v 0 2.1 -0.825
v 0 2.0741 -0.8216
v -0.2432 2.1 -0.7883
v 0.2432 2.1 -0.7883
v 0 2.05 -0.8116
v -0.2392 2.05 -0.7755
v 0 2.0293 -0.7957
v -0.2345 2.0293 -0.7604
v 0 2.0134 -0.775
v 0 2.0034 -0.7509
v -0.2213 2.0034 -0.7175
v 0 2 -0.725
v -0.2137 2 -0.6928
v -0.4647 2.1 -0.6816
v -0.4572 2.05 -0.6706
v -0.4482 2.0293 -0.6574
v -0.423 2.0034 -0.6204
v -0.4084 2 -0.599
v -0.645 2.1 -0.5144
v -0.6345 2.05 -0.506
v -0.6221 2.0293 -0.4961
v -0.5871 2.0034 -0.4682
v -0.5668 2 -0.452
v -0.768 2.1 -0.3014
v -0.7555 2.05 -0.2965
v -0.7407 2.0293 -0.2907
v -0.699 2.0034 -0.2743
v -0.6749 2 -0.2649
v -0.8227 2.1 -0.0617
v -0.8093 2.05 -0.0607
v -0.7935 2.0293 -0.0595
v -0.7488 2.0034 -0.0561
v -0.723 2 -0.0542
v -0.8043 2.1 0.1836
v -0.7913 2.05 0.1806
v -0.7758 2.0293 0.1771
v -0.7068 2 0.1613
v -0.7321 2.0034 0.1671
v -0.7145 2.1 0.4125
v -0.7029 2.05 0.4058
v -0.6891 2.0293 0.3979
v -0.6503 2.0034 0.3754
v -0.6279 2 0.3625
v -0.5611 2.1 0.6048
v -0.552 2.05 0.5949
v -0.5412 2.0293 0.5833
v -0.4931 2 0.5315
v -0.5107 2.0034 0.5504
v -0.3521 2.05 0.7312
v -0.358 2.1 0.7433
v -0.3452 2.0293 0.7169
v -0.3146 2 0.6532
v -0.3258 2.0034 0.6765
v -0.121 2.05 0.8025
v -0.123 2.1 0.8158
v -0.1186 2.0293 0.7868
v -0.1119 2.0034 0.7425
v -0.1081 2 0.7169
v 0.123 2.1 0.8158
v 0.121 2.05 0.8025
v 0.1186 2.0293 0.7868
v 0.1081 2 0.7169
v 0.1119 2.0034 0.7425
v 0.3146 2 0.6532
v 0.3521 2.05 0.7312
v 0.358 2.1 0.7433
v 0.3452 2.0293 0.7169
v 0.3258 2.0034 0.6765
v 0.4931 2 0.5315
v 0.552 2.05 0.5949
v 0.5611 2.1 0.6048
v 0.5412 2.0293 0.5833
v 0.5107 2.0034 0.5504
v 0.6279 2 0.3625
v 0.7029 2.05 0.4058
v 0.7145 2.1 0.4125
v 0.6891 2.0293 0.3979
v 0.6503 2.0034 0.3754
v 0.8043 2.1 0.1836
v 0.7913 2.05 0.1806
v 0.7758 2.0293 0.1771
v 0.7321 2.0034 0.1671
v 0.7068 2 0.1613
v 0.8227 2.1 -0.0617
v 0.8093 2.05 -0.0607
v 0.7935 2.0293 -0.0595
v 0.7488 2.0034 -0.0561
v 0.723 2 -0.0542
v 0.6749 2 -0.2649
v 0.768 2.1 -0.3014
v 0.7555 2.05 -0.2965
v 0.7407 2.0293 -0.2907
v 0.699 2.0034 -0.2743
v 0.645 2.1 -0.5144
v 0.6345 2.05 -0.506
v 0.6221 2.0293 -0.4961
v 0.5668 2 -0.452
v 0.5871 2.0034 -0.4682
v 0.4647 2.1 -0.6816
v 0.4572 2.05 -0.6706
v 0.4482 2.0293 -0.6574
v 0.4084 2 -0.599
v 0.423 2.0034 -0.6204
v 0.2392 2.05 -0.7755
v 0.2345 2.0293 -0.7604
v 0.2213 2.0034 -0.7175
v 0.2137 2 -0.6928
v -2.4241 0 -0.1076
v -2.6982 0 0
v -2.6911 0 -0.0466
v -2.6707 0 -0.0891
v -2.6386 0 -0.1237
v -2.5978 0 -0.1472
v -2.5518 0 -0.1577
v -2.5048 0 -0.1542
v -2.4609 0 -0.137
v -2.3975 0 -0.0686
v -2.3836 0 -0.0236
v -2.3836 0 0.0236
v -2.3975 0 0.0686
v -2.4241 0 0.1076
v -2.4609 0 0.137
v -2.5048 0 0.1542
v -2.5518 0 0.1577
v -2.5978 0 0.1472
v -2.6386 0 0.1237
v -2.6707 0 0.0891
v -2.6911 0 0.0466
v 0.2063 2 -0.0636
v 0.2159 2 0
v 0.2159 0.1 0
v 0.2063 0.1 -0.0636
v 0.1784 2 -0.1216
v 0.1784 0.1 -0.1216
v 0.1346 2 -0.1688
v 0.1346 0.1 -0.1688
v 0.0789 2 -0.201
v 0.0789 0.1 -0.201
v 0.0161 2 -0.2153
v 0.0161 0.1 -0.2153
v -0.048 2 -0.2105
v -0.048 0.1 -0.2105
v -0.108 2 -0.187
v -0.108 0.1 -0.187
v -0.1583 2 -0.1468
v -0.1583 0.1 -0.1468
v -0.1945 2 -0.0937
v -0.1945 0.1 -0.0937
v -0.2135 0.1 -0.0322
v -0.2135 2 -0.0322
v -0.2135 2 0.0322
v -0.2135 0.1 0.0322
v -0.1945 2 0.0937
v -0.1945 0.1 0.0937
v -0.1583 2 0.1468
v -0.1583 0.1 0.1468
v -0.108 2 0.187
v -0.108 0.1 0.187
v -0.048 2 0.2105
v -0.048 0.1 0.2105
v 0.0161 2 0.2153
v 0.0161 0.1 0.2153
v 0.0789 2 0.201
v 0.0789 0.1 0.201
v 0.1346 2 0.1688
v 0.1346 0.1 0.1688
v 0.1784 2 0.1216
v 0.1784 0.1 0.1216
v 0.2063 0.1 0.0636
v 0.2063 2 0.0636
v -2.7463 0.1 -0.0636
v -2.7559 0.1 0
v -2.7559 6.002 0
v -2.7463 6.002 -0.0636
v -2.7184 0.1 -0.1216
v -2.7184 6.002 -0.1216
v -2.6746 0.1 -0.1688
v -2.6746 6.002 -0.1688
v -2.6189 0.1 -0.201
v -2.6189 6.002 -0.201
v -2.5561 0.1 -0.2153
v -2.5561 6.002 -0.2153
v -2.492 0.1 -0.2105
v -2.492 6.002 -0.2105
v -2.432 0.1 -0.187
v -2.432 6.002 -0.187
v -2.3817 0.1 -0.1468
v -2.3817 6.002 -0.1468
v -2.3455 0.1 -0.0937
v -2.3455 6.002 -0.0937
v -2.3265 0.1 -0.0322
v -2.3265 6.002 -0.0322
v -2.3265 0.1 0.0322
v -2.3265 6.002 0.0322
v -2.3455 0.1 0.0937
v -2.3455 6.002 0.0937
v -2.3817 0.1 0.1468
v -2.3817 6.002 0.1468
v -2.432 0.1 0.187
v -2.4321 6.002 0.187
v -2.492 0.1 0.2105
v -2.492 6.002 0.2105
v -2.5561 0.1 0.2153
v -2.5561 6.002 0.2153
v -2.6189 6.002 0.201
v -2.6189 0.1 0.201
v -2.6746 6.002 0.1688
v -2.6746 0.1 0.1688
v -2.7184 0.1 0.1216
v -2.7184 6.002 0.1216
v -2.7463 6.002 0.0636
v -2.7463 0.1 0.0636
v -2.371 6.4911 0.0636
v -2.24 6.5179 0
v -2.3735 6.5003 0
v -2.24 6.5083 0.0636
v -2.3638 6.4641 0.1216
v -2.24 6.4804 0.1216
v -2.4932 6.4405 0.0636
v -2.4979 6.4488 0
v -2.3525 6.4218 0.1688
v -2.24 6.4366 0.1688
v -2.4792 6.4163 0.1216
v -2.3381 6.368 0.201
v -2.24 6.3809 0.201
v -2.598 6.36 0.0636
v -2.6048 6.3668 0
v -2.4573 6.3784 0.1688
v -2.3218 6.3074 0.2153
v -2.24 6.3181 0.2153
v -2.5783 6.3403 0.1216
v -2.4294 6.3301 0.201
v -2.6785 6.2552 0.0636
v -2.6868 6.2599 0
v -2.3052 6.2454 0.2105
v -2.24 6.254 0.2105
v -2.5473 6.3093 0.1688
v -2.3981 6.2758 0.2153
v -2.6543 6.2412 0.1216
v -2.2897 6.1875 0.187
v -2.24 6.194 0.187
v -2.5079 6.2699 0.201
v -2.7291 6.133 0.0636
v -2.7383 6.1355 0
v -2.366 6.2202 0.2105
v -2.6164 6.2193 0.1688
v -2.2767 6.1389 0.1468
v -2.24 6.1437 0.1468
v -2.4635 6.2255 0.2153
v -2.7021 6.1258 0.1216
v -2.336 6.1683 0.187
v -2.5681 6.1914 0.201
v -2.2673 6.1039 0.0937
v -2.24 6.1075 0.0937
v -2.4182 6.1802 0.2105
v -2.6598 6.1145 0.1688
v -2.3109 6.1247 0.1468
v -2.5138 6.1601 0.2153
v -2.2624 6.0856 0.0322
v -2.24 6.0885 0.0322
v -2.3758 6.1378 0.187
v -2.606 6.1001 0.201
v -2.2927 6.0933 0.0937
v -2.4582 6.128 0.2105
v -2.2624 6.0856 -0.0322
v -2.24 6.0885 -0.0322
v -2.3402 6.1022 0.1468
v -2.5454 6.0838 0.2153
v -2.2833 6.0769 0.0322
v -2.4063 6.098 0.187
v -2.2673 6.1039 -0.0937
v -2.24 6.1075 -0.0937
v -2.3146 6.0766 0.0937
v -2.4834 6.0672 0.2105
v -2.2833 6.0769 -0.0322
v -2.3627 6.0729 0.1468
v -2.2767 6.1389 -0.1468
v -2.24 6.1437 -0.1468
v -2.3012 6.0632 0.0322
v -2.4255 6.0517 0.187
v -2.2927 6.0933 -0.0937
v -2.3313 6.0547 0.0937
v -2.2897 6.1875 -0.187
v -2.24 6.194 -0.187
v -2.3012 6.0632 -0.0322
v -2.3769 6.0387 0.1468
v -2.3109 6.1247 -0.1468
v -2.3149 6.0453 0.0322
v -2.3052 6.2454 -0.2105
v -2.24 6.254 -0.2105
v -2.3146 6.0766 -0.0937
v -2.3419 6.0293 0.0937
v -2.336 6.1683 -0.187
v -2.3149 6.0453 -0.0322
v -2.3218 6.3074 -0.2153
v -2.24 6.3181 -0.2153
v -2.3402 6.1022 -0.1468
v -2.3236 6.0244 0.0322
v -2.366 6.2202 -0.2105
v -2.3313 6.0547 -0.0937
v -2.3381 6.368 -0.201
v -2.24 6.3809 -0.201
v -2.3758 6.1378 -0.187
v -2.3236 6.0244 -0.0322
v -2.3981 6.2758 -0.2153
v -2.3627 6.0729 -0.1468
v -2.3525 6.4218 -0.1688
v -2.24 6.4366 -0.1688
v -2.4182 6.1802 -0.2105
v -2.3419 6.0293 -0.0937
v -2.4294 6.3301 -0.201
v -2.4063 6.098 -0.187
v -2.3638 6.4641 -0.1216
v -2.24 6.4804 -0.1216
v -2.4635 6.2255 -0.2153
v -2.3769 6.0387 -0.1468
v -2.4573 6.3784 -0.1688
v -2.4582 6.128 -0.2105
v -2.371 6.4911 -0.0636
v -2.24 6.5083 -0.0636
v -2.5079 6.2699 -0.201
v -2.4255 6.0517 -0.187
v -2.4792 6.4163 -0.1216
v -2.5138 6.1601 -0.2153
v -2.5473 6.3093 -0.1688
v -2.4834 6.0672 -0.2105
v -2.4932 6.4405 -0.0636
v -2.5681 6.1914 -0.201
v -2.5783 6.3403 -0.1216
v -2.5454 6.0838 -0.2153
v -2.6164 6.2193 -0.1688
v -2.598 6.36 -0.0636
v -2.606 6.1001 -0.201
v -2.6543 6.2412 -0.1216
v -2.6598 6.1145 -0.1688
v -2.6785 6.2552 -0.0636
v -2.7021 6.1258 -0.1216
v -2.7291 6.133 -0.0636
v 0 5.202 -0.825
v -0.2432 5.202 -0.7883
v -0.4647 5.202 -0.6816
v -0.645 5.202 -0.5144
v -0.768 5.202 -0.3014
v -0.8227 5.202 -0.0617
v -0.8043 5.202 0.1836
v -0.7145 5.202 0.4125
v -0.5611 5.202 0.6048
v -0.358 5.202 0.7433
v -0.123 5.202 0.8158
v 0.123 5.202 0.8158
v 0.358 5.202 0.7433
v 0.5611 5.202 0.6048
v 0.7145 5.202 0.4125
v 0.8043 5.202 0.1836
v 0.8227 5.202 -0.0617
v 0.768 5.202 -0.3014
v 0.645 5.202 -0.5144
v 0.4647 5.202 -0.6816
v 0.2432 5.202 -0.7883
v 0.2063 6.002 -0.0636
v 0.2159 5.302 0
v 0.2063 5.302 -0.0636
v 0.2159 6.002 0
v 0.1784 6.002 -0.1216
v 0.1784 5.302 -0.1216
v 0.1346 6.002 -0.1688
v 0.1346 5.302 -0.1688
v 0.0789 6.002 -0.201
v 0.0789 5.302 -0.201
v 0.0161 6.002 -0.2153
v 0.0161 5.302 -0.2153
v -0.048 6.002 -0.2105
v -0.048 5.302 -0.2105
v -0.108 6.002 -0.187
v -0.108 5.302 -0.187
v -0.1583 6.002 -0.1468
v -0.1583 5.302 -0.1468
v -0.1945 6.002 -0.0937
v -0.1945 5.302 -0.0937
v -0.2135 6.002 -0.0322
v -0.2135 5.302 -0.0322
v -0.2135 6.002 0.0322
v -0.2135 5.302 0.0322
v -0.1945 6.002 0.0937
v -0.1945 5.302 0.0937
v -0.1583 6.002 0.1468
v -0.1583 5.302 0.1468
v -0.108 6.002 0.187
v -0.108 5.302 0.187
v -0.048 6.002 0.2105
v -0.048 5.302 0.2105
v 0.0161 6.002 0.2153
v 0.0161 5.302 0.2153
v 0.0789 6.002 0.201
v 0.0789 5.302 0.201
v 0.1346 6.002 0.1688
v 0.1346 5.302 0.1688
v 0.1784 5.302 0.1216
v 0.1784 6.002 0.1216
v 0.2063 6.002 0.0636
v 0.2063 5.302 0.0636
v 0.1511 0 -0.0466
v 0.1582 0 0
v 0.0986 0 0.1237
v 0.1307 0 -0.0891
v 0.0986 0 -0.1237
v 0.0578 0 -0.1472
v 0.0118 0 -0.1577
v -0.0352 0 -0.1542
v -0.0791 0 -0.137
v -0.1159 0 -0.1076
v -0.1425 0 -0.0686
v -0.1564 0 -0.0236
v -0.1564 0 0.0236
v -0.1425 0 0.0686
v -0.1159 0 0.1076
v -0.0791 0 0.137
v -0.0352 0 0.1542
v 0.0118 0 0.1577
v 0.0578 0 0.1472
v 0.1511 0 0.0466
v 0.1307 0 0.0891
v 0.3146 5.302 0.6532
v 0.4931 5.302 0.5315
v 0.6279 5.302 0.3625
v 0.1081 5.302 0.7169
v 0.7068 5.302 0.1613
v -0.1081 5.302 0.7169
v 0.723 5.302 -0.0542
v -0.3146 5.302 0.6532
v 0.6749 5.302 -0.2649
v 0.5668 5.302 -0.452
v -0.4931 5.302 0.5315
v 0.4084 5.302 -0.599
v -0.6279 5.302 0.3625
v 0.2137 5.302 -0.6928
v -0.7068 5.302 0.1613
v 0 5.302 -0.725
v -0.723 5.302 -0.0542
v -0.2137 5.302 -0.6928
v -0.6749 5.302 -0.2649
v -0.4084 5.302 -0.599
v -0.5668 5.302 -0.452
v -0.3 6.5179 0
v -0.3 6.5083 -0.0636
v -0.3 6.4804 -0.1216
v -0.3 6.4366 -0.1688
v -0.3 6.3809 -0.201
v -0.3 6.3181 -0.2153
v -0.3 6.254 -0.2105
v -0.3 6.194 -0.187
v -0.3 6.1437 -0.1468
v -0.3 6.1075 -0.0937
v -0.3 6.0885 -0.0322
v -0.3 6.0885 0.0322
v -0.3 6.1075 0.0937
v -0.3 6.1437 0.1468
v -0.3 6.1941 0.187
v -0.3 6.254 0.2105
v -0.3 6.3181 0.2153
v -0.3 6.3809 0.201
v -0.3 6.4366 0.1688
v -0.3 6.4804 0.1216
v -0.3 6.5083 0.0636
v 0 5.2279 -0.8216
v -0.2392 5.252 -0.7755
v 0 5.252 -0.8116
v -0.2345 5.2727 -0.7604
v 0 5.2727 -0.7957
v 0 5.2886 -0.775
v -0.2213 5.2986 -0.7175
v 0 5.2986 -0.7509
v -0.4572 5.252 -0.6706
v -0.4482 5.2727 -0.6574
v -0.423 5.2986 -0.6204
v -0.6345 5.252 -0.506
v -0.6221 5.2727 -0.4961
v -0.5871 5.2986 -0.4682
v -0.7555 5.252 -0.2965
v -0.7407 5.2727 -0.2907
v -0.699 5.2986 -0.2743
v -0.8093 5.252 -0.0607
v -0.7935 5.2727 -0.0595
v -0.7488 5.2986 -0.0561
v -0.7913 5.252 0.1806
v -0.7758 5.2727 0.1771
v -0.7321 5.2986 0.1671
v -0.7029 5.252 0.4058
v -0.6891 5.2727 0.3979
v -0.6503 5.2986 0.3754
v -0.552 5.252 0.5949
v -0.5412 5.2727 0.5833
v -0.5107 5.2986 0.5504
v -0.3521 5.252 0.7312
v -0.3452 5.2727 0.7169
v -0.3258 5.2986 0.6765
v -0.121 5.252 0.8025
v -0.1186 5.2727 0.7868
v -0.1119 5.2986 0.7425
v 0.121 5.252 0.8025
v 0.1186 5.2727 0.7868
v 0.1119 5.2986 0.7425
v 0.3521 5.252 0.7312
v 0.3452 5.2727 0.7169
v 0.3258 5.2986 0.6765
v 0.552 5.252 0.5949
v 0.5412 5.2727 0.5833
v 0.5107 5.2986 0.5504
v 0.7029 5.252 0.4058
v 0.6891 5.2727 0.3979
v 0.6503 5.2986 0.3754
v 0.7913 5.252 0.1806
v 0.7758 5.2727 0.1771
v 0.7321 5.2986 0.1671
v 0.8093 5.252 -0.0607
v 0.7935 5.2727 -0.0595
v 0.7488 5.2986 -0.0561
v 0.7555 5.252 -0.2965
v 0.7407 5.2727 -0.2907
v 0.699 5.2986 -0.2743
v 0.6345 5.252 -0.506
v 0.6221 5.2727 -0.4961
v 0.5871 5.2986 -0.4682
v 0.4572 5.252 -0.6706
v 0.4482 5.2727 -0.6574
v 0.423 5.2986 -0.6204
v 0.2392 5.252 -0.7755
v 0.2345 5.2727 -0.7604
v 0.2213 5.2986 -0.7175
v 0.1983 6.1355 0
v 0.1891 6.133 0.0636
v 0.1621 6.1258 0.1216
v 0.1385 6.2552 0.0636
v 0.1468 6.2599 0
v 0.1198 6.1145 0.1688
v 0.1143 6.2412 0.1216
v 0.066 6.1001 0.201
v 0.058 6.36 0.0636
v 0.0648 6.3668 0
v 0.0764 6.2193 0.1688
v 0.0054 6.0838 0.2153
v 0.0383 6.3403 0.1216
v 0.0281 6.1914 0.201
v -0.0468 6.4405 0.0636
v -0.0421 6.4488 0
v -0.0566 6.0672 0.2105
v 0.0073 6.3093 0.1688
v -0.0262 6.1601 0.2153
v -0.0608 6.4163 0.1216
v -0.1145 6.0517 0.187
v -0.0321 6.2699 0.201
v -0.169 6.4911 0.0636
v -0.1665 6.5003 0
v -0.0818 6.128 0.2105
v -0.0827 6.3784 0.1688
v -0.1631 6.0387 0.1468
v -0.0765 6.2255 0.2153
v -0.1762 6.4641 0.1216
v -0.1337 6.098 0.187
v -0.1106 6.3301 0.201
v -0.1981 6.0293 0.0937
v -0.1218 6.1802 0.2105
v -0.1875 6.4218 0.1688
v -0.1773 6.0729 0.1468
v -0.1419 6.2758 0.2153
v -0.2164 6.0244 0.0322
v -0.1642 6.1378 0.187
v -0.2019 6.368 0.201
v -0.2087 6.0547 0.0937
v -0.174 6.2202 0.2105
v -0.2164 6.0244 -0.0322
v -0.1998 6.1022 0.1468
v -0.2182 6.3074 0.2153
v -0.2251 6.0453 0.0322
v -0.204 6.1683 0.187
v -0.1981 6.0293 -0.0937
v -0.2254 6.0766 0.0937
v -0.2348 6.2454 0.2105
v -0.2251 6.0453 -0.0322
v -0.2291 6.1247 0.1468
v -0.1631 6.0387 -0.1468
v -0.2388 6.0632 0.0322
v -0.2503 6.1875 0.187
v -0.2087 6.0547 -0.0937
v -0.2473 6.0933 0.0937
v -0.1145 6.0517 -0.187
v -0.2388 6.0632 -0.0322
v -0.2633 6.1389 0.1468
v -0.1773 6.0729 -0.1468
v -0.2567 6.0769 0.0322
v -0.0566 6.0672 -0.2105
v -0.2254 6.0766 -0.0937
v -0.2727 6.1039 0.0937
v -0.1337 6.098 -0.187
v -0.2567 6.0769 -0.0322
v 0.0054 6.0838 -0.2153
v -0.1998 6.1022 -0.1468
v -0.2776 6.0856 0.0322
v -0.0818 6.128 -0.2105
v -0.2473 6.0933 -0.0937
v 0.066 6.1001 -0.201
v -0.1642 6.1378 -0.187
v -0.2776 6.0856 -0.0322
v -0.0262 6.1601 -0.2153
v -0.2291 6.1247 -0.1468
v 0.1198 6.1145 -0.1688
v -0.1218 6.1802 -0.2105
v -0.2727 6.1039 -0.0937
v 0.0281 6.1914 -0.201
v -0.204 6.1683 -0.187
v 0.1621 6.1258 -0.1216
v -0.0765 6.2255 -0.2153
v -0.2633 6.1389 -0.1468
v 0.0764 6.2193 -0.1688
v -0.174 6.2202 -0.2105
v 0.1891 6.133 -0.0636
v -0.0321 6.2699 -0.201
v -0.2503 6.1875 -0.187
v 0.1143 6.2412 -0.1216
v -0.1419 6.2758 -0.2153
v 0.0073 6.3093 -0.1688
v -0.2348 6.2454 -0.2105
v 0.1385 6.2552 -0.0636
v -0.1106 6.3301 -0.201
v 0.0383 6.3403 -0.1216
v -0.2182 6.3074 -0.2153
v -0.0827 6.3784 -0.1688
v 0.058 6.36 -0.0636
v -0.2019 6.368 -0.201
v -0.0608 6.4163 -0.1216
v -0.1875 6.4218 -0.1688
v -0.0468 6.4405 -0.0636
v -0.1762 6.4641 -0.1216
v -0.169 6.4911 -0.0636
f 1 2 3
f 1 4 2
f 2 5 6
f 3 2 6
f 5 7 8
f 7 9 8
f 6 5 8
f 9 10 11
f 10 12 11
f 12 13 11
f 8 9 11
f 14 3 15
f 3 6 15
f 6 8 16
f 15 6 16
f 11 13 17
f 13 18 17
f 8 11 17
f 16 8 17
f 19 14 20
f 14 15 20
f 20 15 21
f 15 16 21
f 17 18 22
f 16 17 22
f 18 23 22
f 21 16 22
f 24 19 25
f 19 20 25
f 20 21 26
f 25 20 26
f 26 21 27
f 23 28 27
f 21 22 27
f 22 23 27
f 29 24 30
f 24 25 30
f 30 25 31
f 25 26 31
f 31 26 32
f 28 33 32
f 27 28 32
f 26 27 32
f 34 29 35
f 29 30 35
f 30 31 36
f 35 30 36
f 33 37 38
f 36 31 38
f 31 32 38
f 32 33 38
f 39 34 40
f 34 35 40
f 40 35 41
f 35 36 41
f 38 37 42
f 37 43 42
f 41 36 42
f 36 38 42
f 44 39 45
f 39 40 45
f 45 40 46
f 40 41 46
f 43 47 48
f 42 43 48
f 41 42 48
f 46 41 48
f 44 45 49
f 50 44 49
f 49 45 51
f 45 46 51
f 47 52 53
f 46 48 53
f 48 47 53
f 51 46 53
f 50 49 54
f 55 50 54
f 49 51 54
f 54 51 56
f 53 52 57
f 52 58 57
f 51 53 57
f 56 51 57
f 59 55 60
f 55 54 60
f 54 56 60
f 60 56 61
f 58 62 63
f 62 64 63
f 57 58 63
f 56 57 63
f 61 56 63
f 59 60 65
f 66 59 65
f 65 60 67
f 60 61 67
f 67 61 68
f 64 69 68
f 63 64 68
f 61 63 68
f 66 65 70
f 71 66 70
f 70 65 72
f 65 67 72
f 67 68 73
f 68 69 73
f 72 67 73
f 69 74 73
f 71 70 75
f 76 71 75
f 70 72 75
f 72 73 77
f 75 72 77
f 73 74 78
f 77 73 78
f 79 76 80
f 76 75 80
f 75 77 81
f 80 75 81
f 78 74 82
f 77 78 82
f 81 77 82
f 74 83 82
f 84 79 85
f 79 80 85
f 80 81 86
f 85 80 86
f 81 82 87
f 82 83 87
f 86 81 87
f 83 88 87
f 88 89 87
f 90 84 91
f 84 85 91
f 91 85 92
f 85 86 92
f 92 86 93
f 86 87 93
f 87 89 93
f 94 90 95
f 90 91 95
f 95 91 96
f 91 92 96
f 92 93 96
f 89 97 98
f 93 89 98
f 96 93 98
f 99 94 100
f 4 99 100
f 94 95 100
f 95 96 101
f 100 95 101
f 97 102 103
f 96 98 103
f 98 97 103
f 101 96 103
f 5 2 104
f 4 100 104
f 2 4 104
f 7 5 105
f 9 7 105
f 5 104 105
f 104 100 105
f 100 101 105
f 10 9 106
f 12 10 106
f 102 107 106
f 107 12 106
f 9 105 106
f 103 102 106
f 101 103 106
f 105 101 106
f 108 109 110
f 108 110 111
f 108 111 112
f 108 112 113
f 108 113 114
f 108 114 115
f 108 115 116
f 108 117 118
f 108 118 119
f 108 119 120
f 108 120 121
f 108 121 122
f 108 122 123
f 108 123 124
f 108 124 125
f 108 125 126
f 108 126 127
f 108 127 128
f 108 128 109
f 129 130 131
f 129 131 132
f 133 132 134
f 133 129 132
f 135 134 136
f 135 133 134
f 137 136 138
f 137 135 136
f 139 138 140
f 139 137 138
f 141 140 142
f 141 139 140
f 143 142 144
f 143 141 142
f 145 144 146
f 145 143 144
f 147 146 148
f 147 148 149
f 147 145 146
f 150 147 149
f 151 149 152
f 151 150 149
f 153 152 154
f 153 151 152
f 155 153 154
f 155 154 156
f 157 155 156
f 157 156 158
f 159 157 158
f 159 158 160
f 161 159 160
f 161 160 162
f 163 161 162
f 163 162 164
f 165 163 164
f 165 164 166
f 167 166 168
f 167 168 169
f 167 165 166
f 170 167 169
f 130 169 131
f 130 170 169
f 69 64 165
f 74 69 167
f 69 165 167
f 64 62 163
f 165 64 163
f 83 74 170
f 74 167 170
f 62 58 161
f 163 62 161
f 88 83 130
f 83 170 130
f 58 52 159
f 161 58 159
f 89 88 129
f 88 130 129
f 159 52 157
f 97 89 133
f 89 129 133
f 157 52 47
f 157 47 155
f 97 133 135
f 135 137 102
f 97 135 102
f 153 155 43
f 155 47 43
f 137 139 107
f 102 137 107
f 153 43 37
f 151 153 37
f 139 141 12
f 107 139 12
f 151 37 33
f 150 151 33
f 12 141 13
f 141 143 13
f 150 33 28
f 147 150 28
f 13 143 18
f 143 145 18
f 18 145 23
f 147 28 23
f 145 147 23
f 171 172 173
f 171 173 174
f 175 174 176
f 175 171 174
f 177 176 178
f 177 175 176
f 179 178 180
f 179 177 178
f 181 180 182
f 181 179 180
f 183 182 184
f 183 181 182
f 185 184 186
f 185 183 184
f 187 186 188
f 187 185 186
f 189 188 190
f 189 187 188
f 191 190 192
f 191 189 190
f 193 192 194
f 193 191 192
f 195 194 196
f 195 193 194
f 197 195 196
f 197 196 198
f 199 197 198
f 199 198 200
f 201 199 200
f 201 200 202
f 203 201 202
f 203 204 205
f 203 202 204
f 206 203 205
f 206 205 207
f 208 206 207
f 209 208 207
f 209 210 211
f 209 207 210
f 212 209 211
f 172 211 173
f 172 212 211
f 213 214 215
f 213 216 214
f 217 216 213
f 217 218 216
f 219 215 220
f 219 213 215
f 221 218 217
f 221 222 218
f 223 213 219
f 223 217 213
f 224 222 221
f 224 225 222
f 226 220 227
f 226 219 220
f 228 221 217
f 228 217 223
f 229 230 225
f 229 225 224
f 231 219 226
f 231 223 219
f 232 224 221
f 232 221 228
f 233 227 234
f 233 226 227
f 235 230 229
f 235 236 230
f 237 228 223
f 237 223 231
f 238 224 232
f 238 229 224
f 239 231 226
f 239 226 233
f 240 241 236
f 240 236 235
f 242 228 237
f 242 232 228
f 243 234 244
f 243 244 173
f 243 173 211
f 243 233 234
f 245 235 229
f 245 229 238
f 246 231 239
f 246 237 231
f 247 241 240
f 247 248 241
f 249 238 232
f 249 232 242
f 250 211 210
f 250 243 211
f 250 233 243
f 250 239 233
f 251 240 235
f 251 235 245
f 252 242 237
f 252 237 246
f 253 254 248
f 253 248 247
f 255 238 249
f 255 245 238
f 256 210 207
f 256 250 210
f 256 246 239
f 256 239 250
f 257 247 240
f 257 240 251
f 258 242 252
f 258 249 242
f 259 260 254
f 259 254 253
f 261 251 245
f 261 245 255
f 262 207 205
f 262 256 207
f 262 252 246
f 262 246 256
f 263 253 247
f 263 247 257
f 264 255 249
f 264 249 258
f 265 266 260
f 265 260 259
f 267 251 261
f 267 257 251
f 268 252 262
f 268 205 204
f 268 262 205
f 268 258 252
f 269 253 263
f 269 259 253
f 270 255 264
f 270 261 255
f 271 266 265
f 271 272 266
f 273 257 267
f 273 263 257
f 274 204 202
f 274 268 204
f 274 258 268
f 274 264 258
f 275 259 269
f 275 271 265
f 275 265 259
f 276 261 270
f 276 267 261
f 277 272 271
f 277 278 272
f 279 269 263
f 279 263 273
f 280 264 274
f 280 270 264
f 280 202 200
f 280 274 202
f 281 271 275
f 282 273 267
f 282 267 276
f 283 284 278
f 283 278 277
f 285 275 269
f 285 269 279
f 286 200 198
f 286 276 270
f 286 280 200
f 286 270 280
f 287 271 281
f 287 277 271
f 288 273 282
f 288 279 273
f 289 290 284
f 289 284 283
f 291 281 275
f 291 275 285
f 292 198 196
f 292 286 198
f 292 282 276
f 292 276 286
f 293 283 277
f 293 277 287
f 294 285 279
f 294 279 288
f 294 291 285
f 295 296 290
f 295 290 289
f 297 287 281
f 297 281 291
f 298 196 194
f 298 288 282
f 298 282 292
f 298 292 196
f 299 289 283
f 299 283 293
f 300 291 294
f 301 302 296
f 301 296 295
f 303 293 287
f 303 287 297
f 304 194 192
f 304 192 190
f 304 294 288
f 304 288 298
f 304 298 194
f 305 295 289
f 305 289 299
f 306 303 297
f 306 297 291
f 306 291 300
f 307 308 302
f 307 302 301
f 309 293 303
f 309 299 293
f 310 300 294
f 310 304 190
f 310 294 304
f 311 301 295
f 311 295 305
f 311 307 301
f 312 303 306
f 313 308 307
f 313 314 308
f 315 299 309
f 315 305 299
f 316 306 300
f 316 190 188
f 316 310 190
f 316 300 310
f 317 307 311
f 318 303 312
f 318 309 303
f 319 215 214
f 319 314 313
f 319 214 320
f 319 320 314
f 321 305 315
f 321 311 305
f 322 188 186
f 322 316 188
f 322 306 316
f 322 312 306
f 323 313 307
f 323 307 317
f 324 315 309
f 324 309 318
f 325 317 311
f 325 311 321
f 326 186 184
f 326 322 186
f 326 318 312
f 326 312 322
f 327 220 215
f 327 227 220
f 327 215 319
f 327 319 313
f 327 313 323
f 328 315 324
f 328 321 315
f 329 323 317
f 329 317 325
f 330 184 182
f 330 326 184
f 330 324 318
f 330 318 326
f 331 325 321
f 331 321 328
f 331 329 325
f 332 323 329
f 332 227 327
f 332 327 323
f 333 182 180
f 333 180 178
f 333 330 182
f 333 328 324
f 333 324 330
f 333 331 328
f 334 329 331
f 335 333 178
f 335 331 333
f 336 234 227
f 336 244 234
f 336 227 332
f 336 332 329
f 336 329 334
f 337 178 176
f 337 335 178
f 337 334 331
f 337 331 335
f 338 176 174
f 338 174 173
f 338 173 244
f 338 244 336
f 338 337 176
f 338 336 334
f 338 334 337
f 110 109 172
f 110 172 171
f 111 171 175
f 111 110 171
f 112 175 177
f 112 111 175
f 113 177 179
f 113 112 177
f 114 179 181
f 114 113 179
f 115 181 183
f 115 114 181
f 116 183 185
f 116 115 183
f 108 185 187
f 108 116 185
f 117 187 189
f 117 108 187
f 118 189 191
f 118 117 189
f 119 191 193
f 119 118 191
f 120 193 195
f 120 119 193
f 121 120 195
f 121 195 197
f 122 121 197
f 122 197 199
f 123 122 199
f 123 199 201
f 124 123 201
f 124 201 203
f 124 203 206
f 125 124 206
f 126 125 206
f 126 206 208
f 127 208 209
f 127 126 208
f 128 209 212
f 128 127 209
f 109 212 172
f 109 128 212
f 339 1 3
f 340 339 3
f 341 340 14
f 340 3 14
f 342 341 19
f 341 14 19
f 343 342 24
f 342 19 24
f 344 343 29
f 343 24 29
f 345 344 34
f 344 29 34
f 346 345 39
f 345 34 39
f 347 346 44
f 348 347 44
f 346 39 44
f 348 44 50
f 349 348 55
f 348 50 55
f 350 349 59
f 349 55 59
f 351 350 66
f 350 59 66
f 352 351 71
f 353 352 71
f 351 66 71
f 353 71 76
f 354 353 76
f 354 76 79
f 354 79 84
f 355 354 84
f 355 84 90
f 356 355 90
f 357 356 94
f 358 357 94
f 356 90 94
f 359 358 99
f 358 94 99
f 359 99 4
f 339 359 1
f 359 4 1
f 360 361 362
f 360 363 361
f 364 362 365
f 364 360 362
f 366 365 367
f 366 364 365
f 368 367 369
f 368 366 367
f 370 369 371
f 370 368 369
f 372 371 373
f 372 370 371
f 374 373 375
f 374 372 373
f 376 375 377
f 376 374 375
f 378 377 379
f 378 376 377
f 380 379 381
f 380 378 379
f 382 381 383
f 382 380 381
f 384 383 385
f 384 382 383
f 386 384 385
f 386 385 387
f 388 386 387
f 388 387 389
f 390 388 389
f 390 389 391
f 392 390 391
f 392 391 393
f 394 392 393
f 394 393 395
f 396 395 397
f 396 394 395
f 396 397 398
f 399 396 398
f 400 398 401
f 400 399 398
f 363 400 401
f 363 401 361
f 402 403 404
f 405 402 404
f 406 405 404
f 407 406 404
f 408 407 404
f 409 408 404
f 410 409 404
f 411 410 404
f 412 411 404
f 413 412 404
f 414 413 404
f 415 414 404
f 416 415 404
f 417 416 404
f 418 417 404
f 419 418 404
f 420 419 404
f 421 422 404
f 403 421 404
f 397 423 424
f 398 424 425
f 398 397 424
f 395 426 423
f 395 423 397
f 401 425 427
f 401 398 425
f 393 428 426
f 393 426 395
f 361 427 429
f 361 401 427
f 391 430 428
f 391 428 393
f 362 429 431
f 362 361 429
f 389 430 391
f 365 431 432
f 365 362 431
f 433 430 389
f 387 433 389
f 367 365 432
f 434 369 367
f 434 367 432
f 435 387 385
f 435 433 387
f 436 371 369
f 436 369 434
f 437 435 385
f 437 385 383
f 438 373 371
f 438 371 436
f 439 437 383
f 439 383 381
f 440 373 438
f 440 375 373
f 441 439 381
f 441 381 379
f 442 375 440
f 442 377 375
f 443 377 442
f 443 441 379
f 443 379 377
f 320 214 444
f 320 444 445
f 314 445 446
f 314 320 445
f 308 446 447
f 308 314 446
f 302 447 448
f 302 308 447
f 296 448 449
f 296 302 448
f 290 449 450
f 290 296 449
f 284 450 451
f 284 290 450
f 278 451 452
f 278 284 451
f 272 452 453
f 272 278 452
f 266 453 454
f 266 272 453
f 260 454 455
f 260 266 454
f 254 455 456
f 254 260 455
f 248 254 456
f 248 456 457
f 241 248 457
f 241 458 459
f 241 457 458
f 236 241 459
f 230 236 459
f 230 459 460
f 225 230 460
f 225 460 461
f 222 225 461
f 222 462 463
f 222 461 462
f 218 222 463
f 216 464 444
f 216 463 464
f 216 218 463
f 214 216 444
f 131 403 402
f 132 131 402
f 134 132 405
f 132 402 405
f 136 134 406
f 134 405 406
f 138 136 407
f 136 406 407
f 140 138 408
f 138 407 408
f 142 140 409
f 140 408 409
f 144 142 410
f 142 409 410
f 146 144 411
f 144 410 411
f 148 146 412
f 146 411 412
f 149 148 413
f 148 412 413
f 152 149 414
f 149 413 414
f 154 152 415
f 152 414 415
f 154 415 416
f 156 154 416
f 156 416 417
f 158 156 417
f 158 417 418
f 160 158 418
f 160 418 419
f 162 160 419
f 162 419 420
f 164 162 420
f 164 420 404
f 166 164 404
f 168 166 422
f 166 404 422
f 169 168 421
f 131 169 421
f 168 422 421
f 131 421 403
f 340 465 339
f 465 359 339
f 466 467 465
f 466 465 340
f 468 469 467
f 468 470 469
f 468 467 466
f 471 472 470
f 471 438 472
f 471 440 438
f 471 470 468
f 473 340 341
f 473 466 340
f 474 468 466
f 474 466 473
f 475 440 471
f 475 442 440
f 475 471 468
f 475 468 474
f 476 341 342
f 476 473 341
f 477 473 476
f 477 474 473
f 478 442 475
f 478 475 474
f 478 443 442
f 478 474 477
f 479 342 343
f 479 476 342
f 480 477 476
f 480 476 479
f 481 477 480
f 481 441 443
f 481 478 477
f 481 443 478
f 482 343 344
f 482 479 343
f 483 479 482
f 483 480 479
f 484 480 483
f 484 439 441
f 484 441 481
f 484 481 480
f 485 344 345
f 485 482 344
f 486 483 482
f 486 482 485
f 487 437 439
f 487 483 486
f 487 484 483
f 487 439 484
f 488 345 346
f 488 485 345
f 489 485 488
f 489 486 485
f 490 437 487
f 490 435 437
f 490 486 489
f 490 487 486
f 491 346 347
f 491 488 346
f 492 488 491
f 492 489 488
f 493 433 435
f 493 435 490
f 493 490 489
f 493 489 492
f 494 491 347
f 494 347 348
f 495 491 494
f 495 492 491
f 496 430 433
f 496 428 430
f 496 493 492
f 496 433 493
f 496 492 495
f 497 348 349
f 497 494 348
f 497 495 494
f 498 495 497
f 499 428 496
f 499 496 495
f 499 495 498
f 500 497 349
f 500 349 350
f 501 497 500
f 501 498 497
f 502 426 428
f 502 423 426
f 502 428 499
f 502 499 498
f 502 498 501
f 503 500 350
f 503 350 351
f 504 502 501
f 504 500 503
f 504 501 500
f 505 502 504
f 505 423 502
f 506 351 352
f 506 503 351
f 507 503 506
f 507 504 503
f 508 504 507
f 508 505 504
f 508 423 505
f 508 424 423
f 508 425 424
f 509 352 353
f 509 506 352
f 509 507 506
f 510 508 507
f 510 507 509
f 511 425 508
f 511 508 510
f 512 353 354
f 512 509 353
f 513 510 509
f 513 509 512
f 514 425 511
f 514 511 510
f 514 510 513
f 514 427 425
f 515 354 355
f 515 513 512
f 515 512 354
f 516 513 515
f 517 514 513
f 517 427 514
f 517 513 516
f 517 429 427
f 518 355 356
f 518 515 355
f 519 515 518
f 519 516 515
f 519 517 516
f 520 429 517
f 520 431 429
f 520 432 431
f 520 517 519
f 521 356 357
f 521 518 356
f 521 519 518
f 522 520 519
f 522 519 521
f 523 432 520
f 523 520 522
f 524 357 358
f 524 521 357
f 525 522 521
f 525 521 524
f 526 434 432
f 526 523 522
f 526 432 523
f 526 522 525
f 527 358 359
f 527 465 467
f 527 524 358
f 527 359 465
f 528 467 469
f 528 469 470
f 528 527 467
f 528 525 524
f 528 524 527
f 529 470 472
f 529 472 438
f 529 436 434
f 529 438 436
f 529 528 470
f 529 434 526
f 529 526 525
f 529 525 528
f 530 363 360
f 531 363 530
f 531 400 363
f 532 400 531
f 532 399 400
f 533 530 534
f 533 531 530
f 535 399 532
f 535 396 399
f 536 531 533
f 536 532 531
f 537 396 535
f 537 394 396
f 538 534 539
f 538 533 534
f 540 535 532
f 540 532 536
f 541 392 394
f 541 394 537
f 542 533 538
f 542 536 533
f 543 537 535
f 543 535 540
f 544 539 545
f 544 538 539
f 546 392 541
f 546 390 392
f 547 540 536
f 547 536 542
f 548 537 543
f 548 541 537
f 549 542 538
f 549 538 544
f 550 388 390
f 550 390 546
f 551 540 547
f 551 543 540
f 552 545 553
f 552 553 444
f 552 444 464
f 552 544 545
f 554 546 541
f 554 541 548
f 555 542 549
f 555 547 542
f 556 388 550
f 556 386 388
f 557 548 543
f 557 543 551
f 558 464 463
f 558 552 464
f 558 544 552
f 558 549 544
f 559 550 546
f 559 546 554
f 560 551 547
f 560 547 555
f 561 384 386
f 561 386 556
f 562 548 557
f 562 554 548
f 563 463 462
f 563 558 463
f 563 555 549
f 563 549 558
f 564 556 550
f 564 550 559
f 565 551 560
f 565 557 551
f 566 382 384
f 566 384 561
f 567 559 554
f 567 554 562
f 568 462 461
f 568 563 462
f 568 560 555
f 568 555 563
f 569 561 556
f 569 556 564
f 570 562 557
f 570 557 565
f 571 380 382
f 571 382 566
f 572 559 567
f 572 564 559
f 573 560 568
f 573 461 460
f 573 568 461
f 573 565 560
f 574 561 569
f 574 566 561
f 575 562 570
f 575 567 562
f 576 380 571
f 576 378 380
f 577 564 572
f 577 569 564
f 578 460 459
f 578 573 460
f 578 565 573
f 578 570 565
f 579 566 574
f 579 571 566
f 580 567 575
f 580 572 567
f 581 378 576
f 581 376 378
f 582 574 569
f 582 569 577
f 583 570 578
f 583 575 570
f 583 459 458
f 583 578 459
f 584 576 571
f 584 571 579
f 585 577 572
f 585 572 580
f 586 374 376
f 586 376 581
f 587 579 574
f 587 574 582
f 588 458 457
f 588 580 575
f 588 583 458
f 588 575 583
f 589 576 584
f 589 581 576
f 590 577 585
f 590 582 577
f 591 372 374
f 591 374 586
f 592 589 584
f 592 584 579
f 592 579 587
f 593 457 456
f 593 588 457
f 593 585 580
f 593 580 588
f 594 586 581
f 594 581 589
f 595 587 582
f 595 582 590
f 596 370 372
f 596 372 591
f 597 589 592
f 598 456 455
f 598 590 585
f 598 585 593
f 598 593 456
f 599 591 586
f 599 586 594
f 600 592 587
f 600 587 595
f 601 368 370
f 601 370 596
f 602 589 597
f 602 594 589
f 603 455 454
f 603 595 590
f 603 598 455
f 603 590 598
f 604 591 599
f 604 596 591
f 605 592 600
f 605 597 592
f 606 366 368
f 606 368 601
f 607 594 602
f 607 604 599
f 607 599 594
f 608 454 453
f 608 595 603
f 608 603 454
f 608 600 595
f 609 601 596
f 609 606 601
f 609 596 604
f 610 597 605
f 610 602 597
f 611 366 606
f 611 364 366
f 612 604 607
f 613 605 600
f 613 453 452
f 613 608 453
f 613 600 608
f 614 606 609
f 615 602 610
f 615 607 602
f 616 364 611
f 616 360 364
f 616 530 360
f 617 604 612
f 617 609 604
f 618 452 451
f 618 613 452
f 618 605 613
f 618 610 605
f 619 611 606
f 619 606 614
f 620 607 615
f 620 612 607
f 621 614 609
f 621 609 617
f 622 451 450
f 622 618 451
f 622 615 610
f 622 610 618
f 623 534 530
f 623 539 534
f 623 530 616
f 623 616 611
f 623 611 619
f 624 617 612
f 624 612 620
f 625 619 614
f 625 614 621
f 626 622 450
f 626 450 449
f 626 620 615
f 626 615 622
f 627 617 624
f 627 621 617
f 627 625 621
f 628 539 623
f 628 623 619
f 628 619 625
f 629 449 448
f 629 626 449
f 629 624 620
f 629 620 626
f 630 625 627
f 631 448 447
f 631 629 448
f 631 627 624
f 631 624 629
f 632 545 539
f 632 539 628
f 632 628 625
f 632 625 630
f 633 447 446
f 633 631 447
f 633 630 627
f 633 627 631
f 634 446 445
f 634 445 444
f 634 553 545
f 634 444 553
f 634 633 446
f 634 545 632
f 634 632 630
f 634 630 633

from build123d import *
from OCP.BRepFilletAPI import BRepFilletAPI_MakeChamfer

# Parameters (mm, degrees)
SKETCH1_R      = 0.2159
SKETCH3_R      = 0.825
EXTRUDE1_DEPTH = 3.302
FILLET1_R      = 0.1
CHAMFER1_SIZE  = 0.1
CHAMFER1_SIZE2 = 0.057735027


with BuildPart() as part:
    # Sweep1: sweep along a path in Sketch2
    with BuildLine(Plane.XY) as sweep1_path:
        Line((0, 0), (0, 6.002))
        ThreePointArc((0, 6.002), (-0.087867966, 6.214132034), (-0.3, 6.302))
        Line((-0.3, 6.302), (-2.24, 6.302))
        ThreePointArc((-2.24, 6.302), (-2.452132034, 6.214132034), (-2.54, 6.002))
        Line((-2.54, 6.002), (-2.54, 0))
    # Sketch1 → Sweep1 (sweep)
    with BuildSketch(Plane(origin=(0, 0, 0), x_dir=(1, 0, 0), z_dir=(0, 1, 0))):
        Circle(SKETCH1_R)
    sweep(path=sweep1_path.line)

    # Sketch3 → Extrude1 (add)
    with BuildSketch(Plane(origin=(1.111, 2, 0), x_dir=(0, 0, -1), z_dir=(0, 1, 0))):
        with Locations((0, 1.111)):
            Circle(SKETCH3_R)
    extrude(amount=EXTRUDE1_DEPTH)

    # Fillet1
    fillet1_edges = [part.edges().sort_by_distance(p)[0] for p in [
        (0, 5.302, 0.825),
        (0, 2, 0.825),
    ]]
    fillet(fillet1_edges, radius=FILLET1_R)

    # Chamfer1: one chamfer whose edges measure the first distance from different faces: ONE call of the kernel's chamfer builder (chamfer() names one face for all edges)
    chamfer1_edges_1 = [part.edges().sort_by_distance(p)[0] for p in [
        (-0.2159, 0, 0),
    ]]
    chamfer1_side_1 = [part.faces().sort_by_distance(p)[0] for p in [
        (-0.2159, 1, 0),
    ]]
    chamfer1_edges_2 = [part.edges().sort_by_distance(p)[0] for p in [
        (-2.3241, 0, 0),
    ]]
    chamfer1_side_2 = [part.faces().sort_by_distance(p)[0] for p in [
        (-2.3241, 3.001, 0),
    ]]
    chamfer1 = BRepFilletAPI_MakeChamfer(part.part.solid().wrapped)
    for e in chamfer1_edges_1:
        chamfer1.Add(CHAMFER1_SIZE, CHAMFER1_SIZE2, e.wrapped, chamfer1_side_1[0].wrapped)  # the first distance lies on this face
    for e in chamfer1_edges_2:
        chamfer1.Add(CHAMFER1_SIZE, CHAMFER1_SIZE2, e.wrapped, chamfer1_side_2[0].wrapped)  # the first distance lies on this face
    add(Compound.cast(chamfer1.Shape()), mode=Mode.REPLACE)


solid = part.part
